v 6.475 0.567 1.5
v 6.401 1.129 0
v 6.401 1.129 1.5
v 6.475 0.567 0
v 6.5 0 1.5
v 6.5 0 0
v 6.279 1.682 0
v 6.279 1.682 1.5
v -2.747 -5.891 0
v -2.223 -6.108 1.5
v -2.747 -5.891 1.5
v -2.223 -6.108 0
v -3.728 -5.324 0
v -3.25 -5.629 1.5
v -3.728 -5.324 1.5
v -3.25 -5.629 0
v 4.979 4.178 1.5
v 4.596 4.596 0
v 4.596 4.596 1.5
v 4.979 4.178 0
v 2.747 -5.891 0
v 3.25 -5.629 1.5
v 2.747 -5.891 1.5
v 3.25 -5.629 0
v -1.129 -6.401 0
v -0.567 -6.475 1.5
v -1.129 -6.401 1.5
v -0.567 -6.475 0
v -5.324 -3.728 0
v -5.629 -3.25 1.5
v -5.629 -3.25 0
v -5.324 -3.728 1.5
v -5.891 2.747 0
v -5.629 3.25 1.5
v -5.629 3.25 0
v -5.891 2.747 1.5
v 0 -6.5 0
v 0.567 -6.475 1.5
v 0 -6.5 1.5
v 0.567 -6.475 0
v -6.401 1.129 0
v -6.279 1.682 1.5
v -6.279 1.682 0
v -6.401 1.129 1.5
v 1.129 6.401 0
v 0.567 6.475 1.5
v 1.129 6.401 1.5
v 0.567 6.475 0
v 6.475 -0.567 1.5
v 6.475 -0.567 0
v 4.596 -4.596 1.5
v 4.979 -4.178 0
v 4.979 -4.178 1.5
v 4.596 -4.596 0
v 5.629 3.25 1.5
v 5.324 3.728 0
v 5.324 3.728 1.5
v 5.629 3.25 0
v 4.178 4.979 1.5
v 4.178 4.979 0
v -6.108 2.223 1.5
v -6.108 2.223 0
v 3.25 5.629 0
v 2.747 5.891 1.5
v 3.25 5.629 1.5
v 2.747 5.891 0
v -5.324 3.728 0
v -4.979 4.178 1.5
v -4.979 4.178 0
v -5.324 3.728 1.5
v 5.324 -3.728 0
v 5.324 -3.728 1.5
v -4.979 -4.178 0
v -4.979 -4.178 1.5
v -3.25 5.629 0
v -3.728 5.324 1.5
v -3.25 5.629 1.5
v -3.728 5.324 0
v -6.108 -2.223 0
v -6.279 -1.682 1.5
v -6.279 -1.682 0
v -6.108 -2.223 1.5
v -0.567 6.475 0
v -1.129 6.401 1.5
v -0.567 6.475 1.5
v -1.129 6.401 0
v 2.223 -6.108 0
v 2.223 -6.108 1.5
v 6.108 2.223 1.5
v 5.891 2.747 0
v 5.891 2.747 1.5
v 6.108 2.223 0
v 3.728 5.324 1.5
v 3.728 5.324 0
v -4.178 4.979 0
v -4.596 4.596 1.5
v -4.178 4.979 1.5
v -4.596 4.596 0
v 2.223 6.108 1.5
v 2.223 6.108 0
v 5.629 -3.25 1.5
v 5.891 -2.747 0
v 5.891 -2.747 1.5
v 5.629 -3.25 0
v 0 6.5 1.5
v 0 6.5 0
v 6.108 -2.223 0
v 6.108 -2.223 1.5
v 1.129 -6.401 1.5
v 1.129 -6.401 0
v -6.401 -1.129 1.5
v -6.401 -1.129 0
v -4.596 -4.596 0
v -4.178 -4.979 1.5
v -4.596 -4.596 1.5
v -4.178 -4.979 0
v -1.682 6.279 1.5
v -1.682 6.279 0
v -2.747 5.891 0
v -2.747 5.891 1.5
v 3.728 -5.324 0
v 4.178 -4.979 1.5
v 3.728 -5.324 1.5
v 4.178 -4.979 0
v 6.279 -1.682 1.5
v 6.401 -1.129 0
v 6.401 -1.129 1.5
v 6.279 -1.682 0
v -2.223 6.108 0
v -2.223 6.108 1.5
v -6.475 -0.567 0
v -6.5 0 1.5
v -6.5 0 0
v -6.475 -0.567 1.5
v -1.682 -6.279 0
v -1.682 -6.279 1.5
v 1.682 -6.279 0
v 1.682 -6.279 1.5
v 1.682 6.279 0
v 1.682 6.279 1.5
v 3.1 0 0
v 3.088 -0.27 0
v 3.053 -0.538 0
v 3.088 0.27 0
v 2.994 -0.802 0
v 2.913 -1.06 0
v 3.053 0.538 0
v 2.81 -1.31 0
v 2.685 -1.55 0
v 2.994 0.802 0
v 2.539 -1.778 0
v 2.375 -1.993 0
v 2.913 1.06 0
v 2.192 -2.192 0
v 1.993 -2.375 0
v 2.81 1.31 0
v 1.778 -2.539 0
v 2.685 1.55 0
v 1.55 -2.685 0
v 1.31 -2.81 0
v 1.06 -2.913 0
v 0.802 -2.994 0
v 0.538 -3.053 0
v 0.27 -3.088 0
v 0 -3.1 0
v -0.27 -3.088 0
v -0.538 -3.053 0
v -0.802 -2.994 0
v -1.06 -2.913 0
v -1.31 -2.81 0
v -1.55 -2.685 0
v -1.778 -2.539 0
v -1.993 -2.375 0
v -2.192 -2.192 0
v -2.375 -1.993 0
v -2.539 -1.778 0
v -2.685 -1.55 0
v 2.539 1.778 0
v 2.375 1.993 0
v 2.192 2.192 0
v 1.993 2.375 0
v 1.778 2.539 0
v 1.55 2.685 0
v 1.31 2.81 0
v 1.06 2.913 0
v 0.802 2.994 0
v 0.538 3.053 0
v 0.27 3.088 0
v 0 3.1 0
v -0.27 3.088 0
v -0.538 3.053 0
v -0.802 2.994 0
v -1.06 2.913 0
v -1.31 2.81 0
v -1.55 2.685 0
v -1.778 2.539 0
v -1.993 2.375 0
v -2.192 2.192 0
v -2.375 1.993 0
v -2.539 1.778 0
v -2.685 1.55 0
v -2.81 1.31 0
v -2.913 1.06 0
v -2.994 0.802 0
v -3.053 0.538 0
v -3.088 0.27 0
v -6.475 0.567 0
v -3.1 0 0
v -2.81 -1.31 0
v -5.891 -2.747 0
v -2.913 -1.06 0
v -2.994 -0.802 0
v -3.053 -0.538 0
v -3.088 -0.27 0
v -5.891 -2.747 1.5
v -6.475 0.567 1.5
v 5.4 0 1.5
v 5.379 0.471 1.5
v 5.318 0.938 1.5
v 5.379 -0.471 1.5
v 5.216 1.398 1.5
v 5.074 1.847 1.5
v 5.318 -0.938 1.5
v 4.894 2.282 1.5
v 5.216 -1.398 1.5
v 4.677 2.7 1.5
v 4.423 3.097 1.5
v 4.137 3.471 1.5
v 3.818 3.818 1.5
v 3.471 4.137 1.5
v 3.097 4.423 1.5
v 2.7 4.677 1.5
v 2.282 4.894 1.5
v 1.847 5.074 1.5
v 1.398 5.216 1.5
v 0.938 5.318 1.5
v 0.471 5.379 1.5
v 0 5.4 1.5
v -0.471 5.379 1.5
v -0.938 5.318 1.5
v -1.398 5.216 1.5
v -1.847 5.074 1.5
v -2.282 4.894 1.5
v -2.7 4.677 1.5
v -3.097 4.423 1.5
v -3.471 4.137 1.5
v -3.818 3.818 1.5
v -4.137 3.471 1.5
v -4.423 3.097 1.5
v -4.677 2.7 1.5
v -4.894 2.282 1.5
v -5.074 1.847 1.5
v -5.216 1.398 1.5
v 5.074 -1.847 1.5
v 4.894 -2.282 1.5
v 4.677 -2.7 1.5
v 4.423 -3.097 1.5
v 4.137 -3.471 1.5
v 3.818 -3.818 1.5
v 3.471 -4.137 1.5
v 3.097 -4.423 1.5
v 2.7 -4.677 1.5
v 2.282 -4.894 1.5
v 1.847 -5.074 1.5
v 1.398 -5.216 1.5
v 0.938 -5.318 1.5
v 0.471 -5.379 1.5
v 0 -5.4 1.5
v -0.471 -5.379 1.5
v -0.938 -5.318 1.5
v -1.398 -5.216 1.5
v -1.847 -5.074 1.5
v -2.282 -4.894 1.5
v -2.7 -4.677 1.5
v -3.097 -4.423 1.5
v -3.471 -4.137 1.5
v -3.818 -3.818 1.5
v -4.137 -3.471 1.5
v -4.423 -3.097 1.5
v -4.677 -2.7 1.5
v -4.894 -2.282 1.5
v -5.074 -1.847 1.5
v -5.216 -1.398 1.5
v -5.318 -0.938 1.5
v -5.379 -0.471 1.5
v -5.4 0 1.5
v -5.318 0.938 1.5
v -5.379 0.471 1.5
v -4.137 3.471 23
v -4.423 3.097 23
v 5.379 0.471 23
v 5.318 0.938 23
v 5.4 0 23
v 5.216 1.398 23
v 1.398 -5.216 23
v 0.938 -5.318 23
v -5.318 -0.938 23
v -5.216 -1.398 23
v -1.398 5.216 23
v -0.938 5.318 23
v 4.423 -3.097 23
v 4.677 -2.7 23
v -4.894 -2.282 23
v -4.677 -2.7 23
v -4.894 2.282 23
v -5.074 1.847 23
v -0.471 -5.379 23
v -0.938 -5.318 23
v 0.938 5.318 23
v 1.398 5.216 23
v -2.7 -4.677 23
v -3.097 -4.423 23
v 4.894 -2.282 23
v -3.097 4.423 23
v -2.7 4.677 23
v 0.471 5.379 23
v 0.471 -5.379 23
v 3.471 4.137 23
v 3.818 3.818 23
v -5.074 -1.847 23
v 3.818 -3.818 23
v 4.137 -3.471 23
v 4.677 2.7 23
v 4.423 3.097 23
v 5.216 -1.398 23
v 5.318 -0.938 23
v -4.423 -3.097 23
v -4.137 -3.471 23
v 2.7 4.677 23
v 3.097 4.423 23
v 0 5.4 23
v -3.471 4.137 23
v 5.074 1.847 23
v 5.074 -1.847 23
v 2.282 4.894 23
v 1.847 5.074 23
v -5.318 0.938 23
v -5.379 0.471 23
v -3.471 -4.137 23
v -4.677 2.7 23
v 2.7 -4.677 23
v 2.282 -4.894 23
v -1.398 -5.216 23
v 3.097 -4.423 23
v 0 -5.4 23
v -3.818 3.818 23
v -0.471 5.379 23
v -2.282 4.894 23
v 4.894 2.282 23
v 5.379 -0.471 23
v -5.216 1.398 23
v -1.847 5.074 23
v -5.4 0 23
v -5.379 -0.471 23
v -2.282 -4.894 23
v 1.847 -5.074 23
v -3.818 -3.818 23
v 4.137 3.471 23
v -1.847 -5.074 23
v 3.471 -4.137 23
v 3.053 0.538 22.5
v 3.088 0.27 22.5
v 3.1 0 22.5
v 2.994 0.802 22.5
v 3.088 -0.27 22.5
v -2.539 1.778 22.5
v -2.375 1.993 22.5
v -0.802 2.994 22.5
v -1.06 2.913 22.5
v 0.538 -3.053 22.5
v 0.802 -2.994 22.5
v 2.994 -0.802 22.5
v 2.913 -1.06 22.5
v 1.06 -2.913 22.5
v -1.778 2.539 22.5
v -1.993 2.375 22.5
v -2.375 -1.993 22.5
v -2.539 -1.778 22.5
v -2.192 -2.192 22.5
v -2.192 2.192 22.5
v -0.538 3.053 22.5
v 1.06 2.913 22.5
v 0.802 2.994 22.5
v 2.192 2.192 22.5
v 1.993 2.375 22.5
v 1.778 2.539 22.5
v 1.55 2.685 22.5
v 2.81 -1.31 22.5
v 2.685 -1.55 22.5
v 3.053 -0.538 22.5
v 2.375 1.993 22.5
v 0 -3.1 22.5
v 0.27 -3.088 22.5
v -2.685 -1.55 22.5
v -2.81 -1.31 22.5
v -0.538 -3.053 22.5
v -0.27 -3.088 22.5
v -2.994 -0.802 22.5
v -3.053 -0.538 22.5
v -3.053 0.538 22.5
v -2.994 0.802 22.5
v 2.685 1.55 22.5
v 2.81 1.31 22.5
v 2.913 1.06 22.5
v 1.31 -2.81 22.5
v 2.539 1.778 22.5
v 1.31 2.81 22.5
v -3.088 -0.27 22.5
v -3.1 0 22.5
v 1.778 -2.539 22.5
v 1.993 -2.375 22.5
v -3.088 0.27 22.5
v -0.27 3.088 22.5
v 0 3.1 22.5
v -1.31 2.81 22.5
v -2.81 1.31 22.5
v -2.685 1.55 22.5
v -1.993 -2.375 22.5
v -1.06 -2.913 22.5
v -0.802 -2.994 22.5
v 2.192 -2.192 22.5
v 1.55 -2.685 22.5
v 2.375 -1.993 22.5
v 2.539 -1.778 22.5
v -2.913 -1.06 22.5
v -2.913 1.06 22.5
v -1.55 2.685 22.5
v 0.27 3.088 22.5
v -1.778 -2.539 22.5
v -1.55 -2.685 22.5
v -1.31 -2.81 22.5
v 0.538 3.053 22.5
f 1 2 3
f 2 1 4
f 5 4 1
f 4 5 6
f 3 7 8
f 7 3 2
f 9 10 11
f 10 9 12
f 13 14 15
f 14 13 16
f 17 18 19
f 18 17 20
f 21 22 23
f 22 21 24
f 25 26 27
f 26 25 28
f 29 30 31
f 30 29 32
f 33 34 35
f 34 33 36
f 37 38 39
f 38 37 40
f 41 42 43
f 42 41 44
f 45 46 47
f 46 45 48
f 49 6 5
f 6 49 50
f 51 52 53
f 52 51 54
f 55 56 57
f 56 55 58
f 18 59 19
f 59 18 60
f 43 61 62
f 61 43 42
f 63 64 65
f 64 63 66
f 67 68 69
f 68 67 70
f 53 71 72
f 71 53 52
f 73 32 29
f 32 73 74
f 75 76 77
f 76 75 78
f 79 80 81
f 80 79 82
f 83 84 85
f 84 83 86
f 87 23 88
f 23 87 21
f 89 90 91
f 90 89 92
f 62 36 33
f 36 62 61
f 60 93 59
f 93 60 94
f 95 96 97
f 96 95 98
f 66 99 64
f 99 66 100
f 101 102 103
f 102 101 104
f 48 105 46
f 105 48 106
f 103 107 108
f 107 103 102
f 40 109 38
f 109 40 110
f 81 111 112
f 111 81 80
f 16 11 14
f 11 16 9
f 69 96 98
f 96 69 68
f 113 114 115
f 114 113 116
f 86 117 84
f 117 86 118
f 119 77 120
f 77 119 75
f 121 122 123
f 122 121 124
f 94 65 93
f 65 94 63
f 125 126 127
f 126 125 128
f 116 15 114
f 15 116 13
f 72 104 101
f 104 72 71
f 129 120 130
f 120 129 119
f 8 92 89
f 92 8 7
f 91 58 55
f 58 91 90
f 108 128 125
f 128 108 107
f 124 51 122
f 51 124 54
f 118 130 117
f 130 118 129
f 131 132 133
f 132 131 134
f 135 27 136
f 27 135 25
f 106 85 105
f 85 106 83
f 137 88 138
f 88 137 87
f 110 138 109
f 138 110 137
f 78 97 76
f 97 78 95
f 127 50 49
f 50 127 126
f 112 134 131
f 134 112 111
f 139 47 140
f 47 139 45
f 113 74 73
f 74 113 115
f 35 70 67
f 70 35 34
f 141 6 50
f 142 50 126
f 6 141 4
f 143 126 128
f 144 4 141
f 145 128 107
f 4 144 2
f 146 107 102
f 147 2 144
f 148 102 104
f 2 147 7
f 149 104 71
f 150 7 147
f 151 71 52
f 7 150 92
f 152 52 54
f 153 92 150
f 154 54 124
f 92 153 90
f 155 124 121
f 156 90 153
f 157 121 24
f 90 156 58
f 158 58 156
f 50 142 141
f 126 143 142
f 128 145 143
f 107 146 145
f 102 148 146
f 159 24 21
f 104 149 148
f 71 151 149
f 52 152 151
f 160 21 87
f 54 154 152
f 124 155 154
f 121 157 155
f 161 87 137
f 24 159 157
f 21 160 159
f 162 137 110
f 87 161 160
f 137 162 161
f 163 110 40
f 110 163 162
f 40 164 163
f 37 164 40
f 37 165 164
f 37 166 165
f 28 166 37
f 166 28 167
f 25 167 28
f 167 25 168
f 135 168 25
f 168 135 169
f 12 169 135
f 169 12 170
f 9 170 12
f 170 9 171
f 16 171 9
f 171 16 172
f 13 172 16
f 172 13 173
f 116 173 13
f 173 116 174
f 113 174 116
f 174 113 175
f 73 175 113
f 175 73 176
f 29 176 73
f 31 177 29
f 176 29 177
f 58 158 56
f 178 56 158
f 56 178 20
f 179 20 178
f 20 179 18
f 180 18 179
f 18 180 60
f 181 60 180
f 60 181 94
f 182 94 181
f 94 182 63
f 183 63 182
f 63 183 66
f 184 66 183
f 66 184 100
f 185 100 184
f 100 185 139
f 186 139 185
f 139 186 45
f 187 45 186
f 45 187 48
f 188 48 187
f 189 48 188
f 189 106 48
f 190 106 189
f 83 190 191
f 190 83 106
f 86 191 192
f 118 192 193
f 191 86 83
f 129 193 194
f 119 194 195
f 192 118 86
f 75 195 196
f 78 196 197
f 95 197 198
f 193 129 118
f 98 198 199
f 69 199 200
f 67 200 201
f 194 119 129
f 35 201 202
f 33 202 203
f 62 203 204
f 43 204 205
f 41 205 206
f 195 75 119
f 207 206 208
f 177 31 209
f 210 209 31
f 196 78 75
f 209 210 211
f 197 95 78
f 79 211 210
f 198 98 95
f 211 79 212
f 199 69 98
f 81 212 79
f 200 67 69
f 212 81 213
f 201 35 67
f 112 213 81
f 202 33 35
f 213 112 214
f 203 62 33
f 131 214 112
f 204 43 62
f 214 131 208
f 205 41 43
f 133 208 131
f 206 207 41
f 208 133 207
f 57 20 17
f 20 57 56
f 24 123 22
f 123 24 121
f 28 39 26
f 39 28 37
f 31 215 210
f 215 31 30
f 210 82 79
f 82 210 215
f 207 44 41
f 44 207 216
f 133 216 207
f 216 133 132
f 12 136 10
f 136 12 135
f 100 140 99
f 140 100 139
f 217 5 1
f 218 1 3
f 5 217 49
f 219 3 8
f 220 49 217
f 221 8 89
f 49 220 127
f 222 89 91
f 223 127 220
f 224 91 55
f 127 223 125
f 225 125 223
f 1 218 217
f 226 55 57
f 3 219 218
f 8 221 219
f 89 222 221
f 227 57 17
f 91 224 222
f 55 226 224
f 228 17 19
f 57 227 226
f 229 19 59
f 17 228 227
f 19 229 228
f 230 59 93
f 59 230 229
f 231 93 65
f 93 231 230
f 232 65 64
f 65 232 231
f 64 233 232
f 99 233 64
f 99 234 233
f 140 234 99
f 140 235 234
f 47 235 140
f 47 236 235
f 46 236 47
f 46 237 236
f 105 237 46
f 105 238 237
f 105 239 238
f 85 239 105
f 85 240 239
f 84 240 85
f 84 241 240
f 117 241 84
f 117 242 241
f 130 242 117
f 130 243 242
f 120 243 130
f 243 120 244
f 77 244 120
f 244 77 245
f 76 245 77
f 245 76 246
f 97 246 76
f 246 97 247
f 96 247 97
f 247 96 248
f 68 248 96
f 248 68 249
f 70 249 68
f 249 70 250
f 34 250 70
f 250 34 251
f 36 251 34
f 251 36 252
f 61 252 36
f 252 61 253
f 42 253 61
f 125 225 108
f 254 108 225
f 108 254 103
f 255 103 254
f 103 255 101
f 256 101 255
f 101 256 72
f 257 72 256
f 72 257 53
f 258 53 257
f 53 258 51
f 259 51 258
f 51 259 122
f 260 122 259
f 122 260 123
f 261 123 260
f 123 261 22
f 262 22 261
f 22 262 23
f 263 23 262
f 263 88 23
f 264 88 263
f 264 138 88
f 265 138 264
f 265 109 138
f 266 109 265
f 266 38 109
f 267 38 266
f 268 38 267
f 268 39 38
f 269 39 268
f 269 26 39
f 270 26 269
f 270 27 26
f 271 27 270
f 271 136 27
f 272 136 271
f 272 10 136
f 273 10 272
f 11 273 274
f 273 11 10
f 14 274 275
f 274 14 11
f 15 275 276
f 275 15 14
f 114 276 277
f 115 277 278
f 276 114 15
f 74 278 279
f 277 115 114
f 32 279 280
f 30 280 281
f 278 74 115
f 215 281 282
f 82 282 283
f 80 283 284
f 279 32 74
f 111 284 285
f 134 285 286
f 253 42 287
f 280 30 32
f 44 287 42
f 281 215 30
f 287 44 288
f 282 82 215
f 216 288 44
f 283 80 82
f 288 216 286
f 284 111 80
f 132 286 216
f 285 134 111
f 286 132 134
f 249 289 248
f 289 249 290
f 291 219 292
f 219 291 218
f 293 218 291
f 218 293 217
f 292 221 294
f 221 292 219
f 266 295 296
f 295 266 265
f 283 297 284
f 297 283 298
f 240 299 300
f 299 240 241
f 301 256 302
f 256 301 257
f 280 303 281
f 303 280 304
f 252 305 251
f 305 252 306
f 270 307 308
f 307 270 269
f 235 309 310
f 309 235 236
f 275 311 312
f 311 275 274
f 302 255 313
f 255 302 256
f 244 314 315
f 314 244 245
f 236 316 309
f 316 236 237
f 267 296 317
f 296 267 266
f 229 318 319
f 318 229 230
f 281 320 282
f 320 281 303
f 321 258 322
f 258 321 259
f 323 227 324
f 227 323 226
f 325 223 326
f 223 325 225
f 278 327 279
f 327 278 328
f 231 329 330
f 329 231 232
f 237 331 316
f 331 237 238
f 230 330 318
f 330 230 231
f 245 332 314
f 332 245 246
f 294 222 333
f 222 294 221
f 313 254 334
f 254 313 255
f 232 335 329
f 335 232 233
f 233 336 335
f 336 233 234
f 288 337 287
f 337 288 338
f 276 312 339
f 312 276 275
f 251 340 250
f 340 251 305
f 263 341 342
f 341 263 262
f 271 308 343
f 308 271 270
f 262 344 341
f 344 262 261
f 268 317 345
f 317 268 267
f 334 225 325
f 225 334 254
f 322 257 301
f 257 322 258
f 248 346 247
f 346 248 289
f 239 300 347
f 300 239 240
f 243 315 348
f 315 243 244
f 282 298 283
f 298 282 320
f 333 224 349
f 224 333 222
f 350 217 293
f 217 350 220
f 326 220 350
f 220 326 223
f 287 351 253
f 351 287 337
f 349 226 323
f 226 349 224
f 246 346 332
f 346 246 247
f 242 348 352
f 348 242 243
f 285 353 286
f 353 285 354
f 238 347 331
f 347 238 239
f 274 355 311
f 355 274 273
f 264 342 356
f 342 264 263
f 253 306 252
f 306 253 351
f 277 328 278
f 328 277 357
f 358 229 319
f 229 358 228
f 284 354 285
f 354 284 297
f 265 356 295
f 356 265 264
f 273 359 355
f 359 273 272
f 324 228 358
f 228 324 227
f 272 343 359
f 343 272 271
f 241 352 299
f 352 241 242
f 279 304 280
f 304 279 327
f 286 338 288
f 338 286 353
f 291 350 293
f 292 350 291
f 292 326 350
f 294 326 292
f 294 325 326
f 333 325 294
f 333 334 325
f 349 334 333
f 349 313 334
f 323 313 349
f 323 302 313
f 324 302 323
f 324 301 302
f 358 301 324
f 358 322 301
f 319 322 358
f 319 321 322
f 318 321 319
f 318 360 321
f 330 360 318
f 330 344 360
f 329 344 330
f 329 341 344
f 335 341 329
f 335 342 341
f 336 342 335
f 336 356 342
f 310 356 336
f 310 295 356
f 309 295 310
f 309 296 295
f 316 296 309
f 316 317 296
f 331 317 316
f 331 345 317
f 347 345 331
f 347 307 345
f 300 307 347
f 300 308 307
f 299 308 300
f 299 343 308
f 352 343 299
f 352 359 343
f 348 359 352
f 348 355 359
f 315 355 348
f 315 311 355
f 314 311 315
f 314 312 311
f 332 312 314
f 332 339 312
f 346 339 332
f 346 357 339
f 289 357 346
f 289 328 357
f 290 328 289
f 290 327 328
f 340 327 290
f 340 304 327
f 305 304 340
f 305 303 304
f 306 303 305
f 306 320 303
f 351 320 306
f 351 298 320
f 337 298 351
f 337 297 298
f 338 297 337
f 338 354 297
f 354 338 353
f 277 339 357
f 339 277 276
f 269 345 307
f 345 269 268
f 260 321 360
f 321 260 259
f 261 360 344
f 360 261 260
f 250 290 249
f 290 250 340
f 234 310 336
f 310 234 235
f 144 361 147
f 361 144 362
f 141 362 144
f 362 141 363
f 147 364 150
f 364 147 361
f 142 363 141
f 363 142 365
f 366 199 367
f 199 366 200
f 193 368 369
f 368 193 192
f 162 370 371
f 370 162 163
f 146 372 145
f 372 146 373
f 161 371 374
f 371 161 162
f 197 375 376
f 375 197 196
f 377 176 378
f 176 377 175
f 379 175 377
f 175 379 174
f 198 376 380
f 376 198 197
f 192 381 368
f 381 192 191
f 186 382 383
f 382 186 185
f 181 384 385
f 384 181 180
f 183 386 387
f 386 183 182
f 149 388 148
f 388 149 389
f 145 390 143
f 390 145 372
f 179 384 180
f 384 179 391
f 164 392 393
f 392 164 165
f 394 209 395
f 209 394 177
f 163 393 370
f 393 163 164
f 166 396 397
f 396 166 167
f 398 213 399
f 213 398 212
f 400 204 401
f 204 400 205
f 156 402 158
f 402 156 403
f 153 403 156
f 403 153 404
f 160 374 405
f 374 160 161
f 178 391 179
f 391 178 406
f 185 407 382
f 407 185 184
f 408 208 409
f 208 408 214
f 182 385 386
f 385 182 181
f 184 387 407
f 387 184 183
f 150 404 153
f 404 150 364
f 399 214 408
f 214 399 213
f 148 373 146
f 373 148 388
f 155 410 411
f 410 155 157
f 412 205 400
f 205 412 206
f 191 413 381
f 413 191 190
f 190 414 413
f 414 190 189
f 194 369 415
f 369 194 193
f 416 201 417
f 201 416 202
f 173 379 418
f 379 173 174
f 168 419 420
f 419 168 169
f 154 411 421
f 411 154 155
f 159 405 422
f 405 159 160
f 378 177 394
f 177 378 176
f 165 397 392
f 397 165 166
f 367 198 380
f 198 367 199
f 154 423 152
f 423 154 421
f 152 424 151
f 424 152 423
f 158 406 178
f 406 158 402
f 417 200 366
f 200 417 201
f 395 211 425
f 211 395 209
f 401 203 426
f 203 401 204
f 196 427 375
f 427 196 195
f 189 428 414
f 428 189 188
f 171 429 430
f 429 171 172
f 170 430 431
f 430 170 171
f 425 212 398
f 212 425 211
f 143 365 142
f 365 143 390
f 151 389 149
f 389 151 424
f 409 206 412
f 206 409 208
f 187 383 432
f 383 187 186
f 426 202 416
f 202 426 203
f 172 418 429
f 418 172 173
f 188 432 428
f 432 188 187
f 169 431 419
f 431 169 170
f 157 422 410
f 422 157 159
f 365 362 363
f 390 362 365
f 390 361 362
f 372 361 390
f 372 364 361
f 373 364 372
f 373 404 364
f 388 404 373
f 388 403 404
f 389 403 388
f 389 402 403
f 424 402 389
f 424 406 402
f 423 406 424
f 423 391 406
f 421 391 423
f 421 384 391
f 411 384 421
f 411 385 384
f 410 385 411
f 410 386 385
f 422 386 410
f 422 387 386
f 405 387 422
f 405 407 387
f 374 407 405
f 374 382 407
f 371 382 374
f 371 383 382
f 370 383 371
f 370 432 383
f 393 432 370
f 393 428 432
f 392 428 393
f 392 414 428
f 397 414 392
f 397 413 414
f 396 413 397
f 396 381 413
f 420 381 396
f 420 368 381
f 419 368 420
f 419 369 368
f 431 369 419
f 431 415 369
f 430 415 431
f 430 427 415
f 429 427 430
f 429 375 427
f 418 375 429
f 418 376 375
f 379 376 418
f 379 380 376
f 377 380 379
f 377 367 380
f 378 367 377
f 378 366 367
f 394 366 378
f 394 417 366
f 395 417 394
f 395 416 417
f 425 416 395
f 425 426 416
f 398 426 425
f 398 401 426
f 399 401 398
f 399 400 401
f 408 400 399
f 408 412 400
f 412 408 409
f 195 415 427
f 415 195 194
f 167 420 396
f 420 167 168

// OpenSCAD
// Adapter sleeve - a collar with a sleeve body that lines a 1.5 mL tube rack hole to
// hold a 0.2 mL PCR tube. Printed upside down: the collar lies on the bed and the
// sleeve body rises above it. A through-bore open at both ends.
//

collar_d  = 13;
collar_h  = 1.5;
body_d    = 10.8;
body_h    = 21.5;
bore      = 6.2;

$fn = 72;

collar_t = 2;

difference() {
    union() {
        cylinder(h = collar_h, d = collar_d);
        translate([0, 0, collar_h]) cylinder(h = body_h, d = body_d);
    }
    translate([0, 0, -1]) cylinder(h = body_h + 2, d = bore);
}
